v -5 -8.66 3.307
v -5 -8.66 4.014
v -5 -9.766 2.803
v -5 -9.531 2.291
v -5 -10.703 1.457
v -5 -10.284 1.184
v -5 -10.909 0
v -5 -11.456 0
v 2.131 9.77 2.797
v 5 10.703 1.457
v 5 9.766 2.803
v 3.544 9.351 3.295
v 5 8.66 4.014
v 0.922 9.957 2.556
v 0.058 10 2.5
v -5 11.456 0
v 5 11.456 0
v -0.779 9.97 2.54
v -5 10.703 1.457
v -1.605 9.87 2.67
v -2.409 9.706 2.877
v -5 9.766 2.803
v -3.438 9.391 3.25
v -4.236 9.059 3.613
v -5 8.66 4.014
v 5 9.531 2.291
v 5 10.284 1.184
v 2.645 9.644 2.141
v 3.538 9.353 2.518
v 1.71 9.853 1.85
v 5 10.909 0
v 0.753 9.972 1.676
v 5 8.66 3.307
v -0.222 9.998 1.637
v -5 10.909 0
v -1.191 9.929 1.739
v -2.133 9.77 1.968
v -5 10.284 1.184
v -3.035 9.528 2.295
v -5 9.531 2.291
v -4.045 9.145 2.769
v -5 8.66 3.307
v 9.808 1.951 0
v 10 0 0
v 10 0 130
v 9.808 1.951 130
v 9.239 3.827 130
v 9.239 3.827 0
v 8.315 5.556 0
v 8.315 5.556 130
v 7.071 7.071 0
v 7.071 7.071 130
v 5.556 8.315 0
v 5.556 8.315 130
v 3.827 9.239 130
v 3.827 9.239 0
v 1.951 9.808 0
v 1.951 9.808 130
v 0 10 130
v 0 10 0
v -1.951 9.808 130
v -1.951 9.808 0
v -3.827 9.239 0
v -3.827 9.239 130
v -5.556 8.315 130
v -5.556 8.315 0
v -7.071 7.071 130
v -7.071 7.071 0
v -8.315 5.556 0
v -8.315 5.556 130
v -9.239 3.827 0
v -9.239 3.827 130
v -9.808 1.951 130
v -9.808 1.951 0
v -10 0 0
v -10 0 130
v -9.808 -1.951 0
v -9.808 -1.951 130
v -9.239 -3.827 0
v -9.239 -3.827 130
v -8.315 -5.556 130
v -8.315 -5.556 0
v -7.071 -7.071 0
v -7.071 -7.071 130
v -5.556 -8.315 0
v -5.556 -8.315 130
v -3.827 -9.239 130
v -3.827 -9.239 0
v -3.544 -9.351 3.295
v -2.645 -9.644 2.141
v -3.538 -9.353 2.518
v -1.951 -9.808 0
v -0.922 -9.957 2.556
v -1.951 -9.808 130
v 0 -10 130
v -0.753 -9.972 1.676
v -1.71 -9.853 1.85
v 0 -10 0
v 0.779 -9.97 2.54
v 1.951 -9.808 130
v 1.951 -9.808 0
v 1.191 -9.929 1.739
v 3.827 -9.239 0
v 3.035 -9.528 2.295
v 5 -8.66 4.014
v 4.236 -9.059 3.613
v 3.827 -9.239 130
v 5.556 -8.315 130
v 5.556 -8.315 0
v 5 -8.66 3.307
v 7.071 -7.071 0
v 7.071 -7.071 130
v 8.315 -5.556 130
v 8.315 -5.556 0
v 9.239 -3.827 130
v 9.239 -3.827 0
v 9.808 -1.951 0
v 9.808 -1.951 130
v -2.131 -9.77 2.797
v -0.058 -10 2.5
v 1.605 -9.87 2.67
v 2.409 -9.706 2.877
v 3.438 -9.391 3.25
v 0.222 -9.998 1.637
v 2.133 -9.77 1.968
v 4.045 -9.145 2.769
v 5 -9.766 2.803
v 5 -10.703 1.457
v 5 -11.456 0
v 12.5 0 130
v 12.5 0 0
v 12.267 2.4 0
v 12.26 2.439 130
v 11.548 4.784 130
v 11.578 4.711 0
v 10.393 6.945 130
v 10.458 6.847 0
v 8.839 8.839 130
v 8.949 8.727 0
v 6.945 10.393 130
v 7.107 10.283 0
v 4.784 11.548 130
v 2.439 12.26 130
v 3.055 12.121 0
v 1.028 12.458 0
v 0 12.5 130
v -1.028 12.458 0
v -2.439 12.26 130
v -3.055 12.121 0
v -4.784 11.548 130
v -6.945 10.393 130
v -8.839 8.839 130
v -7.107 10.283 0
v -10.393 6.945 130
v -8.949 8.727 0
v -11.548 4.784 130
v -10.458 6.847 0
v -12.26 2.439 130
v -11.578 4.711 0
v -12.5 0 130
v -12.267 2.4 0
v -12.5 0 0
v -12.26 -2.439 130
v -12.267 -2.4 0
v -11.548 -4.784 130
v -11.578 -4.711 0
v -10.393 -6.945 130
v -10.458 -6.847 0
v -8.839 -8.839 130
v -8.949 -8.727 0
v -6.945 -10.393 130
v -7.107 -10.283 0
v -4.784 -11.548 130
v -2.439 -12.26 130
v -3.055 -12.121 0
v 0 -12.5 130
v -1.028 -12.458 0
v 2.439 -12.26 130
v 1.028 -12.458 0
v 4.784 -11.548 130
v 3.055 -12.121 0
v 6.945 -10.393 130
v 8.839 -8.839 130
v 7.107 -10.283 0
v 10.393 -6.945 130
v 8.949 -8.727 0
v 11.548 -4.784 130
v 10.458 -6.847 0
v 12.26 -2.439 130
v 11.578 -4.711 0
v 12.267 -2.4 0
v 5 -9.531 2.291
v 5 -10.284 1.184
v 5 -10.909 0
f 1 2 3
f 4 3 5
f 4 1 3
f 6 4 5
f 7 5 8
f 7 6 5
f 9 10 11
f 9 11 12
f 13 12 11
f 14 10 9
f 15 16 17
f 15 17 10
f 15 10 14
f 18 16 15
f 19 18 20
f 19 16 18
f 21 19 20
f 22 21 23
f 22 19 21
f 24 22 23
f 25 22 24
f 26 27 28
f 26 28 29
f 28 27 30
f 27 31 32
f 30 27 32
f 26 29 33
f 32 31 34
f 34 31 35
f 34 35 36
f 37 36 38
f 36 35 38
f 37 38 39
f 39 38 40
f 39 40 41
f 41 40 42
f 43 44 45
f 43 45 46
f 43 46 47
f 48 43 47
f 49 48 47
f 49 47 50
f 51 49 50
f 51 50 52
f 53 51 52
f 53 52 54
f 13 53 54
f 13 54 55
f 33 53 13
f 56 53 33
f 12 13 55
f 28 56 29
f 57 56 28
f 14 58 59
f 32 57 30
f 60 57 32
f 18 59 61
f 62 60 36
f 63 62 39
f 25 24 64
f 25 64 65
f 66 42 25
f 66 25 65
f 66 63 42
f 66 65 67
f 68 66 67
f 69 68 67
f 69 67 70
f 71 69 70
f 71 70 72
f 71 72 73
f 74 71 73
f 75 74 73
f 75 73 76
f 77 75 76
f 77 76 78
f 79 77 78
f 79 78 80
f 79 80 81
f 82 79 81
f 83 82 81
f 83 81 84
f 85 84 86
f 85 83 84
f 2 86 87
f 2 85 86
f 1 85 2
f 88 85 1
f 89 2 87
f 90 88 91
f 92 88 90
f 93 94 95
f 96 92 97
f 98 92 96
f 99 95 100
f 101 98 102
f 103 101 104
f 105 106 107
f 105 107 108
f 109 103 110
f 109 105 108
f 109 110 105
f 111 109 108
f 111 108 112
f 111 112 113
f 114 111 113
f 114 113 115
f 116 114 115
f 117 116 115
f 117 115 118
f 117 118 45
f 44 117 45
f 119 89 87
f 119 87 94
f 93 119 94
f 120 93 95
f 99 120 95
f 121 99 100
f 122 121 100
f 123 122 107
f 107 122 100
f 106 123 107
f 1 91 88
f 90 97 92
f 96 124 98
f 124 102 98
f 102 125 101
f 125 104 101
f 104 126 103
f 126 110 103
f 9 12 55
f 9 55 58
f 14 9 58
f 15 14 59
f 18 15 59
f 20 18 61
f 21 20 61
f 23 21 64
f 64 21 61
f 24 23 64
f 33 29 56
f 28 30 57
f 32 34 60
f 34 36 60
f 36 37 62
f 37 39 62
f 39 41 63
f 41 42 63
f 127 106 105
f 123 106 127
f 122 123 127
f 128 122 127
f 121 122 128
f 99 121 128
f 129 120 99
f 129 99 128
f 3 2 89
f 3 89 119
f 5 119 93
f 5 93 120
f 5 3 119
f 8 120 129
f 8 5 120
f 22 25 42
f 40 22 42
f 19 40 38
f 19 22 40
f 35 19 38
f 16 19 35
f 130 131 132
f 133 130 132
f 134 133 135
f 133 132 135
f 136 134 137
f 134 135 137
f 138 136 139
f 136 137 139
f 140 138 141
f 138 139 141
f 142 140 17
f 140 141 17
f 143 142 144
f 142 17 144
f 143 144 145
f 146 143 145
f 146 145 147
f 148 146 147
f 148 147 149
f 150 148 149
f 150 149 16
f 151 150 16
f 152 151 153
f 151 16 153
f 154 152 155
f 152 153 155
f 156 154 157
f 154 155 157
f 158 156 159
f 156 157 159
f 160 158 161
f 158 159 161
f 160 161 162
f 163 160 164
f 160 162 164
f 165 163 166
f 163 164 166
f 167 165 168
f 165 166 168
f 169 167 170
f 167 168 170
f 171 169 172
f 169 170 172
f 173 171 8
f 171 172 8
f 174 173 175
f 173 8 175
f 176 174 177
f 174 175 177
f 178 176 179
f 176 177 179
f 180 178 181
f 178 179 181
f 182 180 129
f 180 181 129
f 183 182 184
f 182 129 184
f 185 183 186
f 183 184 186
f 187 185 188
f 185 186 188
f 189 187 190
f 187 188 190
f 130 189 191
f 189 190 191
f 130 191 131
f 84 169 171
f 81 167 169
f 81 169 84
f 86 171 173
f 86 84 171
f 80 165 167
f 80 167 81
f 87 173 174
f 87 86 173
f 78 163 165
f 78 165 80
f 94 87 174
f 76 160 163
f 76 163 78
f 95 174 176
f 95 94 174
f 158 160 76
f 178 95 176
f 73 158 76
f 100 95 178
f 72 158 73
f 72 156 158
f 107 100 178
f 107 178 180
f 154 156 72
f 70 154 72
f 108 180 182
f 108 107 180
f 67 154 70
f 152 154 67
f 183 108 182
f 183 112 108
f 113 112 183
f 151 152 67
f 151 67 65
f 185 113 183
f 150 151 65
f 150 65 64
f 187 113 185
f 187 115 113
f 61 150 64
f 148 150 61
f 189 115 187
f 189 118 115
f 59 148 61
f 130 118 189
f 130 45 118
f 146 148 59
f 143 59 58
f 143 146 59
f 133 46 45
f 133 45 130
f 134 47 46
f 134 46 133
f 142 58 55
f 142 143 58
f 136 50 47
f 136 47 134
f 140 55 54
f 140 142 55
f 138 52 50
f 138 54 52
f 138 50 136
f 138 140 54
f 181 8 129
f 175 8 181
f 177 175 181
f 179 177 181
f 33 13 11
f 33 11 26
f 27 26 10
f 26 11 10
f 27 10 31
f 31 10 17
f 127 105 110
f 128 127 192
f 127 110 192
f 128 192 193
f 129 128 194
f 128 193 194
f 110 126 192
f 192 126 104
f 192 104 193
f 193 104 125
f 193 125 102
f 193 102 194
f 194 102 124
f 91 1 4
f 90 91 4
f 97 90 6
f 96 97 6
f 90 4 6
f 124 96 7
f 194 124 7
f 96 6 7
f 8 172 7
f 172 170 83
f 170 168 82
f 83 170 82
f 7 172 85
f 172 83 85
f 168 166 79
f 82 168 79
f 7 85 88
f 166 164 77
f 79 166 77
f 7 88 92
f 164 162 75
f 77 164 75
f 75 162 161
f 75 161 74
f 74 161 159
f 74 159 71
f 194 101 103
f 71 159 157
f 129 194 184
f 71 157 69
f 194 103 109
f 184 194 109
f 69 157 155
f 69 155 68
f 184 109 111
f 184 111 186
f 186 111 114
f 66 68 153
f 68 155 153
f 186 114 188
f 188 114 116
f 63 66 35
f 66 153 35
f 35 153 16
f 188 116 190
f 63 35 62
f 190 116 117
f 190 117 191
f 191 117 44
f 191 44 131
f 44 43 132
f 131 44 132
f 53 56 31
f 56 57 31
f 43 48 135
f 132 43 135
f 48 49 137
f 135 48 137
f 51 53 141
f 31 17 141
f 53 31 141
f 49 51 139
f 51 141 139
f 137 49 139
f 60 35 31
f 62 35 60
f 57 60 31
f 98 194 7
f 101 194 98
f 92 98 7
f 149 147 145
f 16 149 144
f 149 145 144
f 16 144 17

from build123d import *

# Parameters (mm, degrees)
ESBO_O1_R                  = 12.5
ESBO_O1_R_2                = 10
RESSALTO_EXTRUS_O1_DEPTH   = 130
CORTE_EXTRUS_O1_DEPTH      = 5
CORTE_EXTRUS_O1_DEPTH_BACK = 5
ESBO_O2_R                  = 12.5
ESBO_O2_R_2                = 12


with BuildPart() as part:
    # Esboço1 → Ressalto-extrusão1 (new body)
    with BuildSketch(Plane.XY):
        Circle(ESBO_O1_R)
        Circle(ESBO_O1_R_2, mode=Mode.SUBTRACT)
    extrude(amount=RESSALTO_EXTRUS_O1_DEPTH)

    # Esboço2 → Corte-extrusão1 (cut, two sides: drawn at the far end of the back side and taken through both)
    with BuildSketch(Plane(origin=(0, 0, 0), x_dir=(0, 0, -1), z_dir=(1, 0, 0)).offset(-CORTE_EXTRUS_O1_DEPTH_BACK)):
        with Locations((5, 0)):
            Circle(ESBO_O2_R)
        with Locations((5, 0)):
            Circle(ESBO_O2_R_2, mode=Mode.SUBTRACT)
    extrude(amount=CORTE_EXTRUS_O1_DEPTH + CORTE_EXTRUS_O1_DEPTH_BACK, mode=Mode.SUBTRACT)


solid = part.part
